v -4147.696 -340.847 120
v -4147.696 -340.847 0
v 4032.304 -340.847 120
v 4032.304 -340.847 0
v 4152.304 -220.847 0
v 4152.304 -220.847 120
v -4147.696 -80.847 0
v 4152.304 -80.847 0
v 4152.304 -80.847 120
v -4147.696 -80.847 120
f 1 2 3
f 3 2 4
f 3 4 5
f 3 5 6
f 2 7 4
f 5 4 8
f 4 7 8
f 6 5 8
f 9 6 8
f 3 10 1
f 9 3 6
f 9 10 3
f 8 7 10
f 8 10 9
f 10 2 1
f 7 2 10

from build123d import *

# Parameters (mm, degrees)
F0_W     = 8300
F0_H     = 260
F1_DEPTH = 120
F2_SIZE2 = 120
F2_SIZE  = 120


with BuildPart() as f1:
    # F0 (on Top) → F1 (new body)
    with BuildSketch(Plane.XY):
        with Locations((2.303854, -210.847361)):
            Rectangle(F0_W, F0_H)
    extrude(amount=F1_DEPTH)

    # F2
    f2_edges = [f1.edges().sort_by_distance(p)[0] for p in [
        (4152.303854, -340.847361, 60),
    ]]
    chamfer(f2_edges, length=F2_SIZE, length2=F2_SIZE2)


solid = f1.part
